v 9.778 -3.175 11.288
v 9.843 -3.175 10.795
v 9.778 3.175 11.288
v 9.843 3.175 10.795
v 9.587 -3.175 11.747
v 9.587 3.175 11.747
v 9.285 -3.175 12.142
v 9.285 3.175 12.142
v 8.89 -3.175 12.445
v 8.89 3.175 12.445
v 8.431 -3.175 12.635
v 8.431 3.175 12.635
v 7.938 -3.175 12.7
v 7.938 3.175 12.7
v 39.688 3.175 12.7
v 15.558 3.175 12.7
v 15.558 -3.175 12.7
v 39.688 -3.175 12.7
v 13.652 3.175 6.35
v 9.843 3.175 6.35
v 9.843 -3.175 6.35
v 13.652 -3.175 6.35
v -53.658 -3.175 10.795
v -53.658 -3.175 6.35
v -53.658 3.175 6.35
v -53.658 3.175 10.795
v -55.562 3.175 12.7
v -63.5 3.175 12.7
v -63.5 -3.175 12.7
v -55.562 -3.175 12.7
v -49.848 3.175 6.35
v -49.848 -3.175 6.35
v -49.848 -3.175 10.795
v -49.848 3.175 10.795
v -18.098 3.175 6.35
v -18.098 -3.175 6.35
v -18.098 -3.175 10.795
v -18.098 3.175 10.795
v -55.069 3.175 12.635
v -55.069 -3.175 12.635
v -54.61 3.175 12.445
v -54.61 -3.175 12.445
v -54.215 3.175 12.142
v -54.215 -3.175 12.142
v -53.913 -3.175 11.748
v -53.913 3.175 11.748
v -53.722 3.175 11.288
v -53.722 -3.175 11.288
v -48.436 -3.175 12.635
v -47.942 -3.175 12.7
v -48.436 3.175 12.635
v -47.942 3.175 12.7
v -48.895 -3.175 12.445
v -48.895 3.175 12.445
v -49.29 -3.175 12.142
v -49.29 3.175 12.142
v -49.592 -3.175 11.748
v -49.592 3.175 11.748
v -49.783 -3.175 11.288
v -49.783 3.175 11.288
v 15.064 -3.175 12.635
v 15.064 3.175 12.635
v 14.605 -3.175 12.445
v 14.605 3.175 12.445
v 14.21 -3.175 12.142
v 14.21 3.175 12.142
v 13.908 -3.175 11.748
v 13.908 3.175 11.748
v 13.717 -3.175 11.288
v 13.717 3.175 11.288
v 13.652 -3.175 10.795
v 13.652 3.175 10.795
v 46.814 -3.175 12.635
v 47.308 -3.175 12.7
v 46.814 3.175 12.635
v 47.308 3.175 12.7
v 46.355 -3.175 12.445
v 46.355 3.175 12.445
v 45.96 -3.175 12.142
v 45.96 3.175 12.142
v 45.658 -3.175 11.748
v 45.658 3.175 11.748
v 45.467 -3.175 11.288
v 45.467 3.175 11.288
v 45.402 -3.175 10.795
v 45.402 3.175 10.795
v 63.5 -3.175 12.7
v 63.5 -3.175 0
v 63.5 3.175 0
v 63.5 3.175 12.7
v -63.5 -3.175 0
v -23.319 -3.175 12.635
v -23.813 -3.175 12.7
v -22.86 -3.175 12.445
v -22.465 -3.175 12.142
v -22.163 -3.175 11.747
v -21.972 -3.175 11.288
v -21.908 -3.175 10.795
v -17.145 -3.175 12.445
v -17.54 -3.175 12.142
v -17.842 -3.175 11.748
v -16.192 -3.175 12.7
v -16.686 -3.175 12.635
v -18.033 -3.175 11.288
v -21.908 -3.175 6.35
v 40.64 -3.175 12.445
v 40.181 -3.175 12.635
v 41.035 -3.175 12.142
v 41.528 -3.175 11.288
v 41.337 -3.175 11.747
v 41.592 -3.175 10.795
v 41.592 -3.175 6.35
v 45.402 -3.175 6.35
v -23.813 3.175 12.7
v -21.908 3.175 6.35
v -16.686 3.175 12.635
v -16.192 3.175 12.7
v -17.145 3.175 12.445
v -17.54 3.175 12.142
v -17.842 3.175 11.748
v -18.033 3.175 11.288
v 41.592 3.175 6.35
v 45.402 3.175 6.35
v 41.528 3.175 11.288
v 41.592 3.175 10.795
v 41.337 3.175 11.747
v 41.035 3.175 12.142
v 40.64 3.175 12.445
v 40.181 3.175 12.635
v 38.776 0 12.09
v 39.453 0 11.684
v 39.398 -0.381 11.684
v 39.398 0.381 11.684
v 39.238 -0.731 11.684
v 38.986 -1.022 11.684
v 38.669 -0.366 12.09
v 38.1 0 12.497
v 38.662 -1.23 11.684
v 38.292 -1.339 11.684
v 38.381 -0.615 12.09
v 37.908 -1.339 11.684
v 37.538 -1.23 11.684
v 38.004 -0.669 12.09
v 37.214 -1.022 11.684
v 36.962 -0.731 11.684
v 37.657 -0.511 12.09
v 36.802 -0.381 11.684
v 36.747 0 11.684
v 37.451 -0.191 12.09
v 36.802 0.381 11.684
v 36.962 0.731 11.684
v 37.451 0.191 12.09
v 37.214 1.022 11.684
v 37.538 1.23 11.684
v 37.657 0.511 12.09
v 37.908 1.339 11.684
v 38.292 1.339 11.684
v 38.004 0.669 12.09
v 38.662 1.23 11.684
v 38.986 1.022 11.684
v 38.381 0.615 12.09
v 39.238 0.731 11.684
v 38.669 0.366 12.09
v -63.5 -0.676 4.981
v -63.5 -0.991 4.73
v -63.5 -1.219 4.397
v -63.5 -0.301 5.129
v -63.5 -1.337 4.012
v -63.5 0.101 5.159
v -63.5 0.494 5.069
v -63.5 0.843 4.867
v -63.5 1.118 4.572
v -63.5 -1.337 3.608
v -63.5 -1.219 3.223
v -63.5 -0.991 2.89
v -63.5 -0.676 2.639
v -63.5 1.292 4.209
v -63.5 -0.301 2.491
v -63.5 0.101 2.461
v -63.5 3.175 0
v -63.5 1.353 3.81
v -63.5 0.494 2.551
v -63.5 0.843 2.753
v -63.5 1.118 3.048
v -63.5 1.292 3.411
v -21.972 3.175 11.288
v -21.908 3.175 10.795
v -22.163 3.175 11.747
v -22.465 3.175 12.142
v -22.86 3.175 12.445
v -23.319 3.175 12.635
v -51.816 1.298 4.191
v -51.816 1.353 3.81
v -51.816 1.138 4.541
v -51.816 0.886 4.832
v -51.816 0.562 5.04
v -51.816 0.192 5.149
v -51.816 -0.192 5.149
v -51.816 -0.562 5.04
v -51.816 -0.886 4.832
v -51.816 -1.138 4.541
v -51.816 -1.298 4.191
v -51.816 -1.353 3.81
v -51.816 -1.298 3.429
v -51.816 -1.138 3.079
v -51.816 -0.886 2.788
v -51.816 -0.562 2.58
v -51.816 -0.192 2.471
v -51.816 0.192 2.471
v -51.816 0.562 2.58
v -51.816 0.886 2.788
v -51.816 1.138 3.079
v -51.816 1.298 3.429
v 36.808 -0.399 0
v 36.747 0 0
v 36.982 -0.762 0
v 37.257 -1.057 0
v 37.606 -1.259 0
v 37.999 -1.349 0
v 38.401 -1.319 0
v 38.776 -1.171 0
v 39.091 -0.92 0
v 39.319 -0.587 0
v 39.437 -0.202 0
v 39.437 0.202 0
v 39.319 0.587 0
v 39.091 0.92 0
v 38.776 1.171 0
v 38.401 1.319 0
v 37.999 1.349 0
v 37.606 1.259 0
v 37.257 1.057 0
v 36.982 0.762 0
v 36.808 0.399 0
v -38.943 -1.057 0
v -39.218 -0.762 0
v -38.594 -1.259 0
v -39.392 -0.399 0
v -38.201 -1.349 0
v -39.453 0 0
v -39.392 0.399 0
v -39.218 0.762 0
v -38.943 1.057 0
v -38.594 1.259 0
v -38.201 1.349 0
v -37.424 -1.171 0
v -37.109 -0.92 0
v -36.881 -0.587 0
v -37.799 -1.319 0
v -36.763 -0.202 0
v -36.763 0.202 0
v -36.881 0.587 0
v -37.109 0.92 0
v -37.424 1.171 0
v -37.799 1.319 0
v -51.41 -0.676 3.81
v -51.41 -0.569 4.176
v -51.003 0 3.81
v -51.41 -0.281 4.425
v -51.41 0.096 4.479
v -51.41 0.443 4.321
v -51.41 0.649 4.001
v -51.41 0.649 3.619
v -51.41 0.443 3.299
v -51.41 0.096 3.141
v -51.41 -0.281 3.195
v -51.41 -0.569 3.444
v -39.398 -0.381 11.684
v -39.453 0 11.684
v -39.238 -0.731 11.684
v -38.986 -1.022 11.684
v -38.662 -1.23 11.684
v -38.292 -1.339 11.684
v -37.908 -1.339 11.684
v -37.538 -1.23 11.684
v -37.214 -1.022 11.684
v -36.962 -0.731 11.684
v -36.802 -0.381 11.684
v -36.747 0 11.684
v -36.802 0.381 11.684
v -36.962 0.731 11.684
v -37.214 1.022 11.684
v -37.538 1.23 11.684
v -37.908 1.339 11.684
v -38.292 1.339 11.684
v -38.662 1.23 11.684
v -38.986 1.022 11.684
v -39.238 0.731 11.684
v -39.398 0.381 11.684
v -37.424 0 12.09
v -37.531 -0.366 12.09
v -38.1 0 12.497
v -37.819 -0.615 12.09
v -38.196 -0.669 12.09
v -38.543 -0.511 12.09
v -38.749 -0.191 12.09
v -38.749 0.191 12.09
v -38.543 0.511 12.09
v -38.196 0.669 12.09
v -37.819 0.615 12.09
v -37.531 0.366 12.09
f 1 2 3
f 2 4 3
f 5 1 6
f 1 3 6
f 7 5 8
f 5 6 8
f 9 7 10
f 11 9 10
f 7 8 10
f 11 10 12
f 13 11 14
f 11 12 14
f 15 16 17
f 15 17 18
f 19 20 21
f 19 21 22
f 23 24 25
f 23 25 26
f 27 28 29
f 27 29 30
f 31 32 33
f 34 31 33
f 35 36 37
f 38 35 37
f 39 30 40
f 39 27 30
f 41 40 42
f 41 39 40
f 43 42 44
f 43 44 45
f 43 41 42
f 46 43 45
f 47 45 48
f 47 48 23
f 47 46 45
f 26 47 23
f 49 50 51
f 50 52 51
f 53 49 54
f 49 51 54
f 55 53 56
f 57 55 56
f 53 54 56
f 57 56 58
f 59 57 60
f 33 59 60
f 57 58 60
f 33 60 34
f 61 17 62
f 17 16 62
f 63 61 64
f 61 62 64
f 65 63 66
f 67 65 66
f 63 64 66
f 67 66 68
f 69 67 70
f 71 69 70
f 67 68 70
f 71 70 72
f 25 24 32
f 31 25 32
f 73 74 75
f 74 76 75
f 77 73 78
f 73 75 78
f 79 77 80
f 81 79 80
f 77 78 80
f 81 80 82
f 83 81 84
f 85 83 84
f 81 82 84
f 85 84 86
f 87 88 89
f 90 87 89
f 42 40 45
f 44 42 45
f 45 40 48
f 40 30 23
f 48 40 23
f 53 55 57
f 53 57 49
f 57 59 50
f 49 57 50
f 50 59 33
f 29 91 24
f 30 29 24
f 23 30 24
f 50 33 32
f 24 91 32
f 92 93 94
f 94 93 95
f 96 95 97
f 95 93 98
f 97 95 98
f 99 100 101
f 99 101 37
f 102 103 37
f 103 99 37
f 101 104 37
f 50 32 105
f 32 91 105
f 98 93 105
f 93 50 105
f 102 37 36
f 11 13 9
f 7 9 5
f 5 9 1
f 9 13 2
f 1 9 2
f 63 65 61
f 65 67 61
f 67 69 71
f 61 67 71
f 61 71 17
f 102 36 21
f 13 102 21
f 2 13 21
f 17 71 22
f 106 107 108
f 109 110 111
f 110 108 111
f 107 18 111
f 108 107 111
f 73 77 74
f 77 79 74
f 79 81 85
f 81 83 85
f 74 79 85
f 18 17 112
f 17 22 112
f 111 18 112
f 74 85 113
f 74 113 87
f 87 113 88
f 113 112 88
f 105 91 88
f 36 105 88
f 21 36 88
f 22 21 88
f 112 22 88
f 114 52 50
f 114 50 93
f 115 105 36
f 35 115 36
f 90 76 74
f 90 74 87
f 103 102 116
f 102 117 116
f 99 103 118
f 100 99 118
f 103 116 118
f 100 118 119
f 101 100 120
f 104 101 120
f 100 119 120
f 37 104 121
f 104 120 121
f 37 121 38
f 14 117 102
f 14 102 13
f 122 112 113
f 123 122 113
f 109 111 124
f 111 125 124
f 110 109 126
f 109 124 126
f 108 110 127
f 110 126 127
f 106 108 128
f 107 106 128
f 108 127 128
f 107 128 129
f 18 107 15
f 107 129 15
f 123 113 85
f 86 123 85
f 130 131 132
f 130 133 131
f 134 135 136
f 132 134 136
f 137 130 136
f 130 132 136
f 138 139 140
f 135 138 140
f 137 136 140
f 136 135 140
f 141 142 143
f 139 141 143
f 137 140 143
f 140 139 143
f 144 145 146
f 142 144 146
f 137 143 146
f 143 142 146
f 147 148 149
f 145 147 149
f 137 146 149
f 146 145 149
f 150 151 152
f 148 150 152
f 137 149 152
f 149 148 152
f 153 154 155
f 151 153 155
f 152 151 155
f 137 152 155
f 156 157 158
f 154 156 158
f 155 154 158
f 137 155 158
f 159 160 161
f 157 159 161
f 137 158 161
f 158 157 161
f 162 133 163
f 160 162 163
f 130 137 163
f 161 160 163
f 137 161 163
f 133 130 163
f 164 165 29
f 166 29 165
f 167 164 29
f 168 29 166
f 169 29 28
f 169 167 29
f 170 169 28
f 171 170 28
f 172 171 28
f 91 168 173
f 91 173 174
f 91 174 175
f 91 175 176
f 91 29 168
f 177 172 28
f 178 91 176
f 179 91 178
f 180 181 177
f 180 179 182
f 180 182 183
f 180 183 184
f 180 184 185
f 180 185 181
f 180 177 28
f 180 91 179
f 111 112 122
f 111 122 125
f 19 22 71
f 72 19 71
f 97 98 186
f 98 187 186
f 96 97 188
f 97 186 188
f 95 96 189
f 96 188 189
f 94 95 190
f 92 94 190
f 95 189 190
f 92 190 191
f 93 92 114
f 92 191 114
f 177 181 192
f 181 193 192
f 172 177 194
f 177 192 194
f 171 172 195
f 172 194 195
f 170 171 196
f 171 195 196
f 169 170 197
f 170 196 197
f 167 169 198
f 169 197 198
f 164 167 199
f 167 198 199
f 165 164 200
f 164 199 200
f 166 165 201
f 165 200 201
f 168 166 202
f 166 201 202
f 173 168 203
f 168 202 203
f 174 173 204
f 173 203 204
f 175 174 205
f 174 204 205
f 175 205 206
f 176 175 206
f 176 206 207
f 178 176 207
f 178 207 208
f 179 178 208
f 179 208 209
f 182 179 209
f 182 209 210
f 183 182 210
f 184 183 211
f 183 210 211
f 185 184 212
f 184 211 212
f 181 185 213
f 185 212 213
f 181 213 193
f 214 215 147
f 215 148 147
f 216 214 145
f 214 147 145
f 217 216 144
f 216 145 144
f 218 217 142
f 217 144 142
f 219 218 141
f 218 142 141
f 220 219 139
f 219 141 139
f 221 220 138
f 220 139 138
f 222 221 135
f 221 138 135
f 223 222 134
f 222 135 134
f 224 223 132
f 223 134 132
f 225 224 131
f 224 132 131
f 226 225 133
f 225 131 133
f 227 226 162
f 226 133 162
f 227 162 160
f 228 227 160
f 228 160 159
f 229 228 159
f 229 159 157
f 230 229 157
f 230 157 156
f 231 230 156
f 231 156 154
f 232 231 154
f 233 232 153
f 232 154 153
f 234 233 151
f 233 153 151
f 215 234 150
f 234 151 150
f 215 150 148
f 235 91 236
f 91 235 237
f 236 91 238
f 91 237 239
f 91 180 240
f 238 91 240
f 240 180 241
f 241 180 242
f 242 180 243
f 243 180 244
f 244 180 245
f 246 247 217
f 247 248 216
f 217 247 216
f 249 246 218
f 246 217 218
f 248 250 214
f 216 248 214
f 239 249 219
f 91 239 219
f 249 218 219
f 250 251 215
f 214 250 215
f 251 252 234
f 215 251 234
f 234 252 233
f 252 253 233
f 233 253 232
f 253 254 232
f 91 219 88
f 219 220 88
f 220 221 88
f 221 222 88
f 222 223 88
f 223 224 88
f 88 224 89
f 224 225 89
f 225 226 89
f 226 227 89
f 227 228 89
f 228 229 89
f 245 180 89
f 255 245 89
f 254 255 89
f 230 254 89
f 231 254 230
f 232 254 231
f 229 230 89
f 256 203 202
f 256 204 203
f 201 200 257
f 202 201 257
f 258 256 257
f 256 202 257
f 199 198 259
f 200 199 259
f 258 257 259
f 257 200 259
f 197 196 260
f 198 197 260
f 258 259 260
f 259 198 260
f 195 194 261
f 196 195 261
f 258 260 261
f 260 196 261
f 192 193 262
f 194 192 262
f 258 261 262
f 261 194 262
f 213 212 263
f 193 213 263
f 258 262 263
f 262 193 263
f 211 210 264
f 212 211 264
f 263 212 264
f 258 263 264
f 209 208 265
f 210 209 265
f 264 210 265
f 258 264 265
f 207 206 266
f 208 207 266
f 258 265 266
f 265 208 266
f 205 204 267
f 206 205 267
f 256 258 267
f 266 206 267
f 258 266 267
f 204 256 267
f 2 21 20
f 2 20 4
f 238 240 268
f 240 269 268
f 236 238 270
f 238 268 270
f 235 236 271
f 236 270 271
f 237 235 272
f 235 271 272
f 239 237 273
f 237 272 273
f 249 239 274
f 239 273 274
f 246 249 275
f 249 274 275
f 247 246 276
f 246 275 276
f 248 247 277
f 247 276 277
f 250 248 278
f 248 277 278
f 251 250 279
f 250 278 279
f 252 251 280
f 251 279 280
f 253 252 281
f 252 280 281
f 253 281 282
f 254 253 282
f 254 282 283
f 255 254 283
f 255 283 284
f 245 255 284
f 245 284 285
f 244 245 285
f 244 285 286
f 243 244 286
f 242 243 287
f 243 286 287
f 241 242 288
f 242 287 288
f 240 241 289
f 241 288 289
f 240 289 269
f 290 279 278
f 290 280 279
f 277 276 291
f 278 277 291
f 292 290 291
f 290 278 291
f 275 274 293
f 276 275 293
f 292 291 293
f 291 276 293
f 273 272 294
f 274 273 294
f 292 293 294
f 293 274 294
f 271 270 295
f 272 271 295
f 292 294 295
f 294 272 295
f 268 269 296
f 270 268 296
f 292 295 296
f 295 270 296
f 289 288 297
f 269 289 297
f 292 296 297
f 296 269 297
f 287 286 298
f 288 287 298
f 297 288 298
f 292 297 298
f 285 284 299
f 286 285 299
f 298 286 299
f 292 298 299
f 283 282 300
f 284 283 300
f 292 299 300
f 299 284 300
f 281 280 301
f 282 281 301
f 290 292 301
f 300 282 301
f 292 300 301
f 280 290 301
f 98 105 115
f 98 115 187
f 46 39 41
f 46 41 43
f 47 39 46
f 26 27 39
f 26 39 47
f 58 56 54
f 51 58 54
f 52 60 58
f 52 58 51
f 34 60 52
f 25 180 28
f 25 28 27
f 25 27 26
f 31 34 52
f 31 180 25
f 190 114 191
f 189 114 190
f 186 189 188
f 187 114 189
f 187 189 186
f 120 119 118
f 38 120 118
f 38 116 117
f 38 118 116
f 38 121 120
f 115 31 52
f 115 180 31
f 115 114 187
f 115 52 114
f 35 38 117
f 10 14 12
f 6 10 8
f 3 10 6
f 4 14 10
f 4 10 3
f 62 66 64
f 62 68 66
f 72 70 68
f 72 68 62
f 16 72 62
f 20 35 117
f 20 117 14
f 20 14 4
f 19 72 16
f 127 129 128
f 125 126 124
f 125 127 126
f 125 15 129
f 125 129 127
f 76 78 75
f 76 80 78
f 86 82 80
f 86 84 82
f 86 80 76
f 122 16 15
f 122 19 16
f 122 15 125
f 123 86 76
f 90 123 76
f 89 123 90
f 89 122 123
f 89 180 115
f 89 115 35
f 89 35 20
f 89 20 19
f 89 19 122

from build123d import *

# Parameters (mm, degrees)
F0_W           = 127
F0_H           = 6.35
F1_DEPTH       = 12.7
F2_W           = 3.81
F2_H           = 6.35
F3_DEPTH       = 6.35
F4_R           = 1.905
F7_D           = 2.7051
F7_DEPTH       = 11.684
F7_TIP         = 0.8126940303
F7_ON_F6_D     = 2.7051
F7_ON_F6_DEPTH = 11.684
F7_ON_F6_TIP   = 0.8126940303


with BuildPart() as f1:
    # F0 (on Top) → F1 (new body)
    with BuildSketch(Plane.XY):
        Rectangle(F0_W, F0_H)
    extrude(amount=F1_DEPTH)

    # F2 (on face) → F3 (cut, through all)
    with BuildSketch(Plane.XZ.offset(3.175)):
        with Locations((-51.7525, 9.525)):
            Rectangle(F2_W, F2_H)
        with Locations((-20.0025, 9.525)):
            Rectangle(F2_W, F2_H)
        with Locations((11.7475, 9.525)):
            Rectangle(F2_W, F2_H)
        with Locations((43.4975, 9.525)):
            Rectangle(F2_W, F2_H)
    extrude(amount=-F3_DEPTH, mode=Mode.SUBTRACT)

    # F4
    f4_edges = [f1.edges().sort_by_distance(p)[0] for p in [
        (-53.6575, 0, 12.7),
        (-49.8475, 0, 12.7),
        (-21.9075, 0, 12.7),
        (-18.0975, 0, 12.7),
        (9.8425, 0, 12.7),
        (13.6525, 0, 12.7),
        (41.5925, 0, 12.7),
        (45.4025, 0, 12.7),
    ]]
    fillet(f4_edges, radius=F4_R)

    # F7
    with Locations(Plane(origin=(0, 0, 0), x_dir=(1, 0, 0), z_dir=(0, 0, -1))):
        with Locations((-38.1, 0), (38.1, 0)):
            Hole(F7_D / 2, depth=F7_DEPTH)
            with Locations((0, 0, -(F7_DEPTH + F7_TIP / 2))):  # 118° drill point
                Cone(0, F7_D / 2, F7_TIP, mode=Mode.SUBTRACT)

    # F7 on F6
    with Locations(Plane(origin=(-63.5, 0, 0), x_dir=(0, -1, 0), z_dir=(-1, 0, 0))):
        with Locations((0, 3.81)):
            Hole(F7_ON_F6_D / 2, depth=F7_ON_F6_DEPTH)
            with Locations((0, 0, -(F7_ON_F6_DEPTH + F7_ON_F6_TIP / 2))):  # 118° drill point
                Cone(0, F7_ON_F6_D / 2, F7_ON_F6_TIP, mode=Mode.SUBTRACT)


solid = f1.part
